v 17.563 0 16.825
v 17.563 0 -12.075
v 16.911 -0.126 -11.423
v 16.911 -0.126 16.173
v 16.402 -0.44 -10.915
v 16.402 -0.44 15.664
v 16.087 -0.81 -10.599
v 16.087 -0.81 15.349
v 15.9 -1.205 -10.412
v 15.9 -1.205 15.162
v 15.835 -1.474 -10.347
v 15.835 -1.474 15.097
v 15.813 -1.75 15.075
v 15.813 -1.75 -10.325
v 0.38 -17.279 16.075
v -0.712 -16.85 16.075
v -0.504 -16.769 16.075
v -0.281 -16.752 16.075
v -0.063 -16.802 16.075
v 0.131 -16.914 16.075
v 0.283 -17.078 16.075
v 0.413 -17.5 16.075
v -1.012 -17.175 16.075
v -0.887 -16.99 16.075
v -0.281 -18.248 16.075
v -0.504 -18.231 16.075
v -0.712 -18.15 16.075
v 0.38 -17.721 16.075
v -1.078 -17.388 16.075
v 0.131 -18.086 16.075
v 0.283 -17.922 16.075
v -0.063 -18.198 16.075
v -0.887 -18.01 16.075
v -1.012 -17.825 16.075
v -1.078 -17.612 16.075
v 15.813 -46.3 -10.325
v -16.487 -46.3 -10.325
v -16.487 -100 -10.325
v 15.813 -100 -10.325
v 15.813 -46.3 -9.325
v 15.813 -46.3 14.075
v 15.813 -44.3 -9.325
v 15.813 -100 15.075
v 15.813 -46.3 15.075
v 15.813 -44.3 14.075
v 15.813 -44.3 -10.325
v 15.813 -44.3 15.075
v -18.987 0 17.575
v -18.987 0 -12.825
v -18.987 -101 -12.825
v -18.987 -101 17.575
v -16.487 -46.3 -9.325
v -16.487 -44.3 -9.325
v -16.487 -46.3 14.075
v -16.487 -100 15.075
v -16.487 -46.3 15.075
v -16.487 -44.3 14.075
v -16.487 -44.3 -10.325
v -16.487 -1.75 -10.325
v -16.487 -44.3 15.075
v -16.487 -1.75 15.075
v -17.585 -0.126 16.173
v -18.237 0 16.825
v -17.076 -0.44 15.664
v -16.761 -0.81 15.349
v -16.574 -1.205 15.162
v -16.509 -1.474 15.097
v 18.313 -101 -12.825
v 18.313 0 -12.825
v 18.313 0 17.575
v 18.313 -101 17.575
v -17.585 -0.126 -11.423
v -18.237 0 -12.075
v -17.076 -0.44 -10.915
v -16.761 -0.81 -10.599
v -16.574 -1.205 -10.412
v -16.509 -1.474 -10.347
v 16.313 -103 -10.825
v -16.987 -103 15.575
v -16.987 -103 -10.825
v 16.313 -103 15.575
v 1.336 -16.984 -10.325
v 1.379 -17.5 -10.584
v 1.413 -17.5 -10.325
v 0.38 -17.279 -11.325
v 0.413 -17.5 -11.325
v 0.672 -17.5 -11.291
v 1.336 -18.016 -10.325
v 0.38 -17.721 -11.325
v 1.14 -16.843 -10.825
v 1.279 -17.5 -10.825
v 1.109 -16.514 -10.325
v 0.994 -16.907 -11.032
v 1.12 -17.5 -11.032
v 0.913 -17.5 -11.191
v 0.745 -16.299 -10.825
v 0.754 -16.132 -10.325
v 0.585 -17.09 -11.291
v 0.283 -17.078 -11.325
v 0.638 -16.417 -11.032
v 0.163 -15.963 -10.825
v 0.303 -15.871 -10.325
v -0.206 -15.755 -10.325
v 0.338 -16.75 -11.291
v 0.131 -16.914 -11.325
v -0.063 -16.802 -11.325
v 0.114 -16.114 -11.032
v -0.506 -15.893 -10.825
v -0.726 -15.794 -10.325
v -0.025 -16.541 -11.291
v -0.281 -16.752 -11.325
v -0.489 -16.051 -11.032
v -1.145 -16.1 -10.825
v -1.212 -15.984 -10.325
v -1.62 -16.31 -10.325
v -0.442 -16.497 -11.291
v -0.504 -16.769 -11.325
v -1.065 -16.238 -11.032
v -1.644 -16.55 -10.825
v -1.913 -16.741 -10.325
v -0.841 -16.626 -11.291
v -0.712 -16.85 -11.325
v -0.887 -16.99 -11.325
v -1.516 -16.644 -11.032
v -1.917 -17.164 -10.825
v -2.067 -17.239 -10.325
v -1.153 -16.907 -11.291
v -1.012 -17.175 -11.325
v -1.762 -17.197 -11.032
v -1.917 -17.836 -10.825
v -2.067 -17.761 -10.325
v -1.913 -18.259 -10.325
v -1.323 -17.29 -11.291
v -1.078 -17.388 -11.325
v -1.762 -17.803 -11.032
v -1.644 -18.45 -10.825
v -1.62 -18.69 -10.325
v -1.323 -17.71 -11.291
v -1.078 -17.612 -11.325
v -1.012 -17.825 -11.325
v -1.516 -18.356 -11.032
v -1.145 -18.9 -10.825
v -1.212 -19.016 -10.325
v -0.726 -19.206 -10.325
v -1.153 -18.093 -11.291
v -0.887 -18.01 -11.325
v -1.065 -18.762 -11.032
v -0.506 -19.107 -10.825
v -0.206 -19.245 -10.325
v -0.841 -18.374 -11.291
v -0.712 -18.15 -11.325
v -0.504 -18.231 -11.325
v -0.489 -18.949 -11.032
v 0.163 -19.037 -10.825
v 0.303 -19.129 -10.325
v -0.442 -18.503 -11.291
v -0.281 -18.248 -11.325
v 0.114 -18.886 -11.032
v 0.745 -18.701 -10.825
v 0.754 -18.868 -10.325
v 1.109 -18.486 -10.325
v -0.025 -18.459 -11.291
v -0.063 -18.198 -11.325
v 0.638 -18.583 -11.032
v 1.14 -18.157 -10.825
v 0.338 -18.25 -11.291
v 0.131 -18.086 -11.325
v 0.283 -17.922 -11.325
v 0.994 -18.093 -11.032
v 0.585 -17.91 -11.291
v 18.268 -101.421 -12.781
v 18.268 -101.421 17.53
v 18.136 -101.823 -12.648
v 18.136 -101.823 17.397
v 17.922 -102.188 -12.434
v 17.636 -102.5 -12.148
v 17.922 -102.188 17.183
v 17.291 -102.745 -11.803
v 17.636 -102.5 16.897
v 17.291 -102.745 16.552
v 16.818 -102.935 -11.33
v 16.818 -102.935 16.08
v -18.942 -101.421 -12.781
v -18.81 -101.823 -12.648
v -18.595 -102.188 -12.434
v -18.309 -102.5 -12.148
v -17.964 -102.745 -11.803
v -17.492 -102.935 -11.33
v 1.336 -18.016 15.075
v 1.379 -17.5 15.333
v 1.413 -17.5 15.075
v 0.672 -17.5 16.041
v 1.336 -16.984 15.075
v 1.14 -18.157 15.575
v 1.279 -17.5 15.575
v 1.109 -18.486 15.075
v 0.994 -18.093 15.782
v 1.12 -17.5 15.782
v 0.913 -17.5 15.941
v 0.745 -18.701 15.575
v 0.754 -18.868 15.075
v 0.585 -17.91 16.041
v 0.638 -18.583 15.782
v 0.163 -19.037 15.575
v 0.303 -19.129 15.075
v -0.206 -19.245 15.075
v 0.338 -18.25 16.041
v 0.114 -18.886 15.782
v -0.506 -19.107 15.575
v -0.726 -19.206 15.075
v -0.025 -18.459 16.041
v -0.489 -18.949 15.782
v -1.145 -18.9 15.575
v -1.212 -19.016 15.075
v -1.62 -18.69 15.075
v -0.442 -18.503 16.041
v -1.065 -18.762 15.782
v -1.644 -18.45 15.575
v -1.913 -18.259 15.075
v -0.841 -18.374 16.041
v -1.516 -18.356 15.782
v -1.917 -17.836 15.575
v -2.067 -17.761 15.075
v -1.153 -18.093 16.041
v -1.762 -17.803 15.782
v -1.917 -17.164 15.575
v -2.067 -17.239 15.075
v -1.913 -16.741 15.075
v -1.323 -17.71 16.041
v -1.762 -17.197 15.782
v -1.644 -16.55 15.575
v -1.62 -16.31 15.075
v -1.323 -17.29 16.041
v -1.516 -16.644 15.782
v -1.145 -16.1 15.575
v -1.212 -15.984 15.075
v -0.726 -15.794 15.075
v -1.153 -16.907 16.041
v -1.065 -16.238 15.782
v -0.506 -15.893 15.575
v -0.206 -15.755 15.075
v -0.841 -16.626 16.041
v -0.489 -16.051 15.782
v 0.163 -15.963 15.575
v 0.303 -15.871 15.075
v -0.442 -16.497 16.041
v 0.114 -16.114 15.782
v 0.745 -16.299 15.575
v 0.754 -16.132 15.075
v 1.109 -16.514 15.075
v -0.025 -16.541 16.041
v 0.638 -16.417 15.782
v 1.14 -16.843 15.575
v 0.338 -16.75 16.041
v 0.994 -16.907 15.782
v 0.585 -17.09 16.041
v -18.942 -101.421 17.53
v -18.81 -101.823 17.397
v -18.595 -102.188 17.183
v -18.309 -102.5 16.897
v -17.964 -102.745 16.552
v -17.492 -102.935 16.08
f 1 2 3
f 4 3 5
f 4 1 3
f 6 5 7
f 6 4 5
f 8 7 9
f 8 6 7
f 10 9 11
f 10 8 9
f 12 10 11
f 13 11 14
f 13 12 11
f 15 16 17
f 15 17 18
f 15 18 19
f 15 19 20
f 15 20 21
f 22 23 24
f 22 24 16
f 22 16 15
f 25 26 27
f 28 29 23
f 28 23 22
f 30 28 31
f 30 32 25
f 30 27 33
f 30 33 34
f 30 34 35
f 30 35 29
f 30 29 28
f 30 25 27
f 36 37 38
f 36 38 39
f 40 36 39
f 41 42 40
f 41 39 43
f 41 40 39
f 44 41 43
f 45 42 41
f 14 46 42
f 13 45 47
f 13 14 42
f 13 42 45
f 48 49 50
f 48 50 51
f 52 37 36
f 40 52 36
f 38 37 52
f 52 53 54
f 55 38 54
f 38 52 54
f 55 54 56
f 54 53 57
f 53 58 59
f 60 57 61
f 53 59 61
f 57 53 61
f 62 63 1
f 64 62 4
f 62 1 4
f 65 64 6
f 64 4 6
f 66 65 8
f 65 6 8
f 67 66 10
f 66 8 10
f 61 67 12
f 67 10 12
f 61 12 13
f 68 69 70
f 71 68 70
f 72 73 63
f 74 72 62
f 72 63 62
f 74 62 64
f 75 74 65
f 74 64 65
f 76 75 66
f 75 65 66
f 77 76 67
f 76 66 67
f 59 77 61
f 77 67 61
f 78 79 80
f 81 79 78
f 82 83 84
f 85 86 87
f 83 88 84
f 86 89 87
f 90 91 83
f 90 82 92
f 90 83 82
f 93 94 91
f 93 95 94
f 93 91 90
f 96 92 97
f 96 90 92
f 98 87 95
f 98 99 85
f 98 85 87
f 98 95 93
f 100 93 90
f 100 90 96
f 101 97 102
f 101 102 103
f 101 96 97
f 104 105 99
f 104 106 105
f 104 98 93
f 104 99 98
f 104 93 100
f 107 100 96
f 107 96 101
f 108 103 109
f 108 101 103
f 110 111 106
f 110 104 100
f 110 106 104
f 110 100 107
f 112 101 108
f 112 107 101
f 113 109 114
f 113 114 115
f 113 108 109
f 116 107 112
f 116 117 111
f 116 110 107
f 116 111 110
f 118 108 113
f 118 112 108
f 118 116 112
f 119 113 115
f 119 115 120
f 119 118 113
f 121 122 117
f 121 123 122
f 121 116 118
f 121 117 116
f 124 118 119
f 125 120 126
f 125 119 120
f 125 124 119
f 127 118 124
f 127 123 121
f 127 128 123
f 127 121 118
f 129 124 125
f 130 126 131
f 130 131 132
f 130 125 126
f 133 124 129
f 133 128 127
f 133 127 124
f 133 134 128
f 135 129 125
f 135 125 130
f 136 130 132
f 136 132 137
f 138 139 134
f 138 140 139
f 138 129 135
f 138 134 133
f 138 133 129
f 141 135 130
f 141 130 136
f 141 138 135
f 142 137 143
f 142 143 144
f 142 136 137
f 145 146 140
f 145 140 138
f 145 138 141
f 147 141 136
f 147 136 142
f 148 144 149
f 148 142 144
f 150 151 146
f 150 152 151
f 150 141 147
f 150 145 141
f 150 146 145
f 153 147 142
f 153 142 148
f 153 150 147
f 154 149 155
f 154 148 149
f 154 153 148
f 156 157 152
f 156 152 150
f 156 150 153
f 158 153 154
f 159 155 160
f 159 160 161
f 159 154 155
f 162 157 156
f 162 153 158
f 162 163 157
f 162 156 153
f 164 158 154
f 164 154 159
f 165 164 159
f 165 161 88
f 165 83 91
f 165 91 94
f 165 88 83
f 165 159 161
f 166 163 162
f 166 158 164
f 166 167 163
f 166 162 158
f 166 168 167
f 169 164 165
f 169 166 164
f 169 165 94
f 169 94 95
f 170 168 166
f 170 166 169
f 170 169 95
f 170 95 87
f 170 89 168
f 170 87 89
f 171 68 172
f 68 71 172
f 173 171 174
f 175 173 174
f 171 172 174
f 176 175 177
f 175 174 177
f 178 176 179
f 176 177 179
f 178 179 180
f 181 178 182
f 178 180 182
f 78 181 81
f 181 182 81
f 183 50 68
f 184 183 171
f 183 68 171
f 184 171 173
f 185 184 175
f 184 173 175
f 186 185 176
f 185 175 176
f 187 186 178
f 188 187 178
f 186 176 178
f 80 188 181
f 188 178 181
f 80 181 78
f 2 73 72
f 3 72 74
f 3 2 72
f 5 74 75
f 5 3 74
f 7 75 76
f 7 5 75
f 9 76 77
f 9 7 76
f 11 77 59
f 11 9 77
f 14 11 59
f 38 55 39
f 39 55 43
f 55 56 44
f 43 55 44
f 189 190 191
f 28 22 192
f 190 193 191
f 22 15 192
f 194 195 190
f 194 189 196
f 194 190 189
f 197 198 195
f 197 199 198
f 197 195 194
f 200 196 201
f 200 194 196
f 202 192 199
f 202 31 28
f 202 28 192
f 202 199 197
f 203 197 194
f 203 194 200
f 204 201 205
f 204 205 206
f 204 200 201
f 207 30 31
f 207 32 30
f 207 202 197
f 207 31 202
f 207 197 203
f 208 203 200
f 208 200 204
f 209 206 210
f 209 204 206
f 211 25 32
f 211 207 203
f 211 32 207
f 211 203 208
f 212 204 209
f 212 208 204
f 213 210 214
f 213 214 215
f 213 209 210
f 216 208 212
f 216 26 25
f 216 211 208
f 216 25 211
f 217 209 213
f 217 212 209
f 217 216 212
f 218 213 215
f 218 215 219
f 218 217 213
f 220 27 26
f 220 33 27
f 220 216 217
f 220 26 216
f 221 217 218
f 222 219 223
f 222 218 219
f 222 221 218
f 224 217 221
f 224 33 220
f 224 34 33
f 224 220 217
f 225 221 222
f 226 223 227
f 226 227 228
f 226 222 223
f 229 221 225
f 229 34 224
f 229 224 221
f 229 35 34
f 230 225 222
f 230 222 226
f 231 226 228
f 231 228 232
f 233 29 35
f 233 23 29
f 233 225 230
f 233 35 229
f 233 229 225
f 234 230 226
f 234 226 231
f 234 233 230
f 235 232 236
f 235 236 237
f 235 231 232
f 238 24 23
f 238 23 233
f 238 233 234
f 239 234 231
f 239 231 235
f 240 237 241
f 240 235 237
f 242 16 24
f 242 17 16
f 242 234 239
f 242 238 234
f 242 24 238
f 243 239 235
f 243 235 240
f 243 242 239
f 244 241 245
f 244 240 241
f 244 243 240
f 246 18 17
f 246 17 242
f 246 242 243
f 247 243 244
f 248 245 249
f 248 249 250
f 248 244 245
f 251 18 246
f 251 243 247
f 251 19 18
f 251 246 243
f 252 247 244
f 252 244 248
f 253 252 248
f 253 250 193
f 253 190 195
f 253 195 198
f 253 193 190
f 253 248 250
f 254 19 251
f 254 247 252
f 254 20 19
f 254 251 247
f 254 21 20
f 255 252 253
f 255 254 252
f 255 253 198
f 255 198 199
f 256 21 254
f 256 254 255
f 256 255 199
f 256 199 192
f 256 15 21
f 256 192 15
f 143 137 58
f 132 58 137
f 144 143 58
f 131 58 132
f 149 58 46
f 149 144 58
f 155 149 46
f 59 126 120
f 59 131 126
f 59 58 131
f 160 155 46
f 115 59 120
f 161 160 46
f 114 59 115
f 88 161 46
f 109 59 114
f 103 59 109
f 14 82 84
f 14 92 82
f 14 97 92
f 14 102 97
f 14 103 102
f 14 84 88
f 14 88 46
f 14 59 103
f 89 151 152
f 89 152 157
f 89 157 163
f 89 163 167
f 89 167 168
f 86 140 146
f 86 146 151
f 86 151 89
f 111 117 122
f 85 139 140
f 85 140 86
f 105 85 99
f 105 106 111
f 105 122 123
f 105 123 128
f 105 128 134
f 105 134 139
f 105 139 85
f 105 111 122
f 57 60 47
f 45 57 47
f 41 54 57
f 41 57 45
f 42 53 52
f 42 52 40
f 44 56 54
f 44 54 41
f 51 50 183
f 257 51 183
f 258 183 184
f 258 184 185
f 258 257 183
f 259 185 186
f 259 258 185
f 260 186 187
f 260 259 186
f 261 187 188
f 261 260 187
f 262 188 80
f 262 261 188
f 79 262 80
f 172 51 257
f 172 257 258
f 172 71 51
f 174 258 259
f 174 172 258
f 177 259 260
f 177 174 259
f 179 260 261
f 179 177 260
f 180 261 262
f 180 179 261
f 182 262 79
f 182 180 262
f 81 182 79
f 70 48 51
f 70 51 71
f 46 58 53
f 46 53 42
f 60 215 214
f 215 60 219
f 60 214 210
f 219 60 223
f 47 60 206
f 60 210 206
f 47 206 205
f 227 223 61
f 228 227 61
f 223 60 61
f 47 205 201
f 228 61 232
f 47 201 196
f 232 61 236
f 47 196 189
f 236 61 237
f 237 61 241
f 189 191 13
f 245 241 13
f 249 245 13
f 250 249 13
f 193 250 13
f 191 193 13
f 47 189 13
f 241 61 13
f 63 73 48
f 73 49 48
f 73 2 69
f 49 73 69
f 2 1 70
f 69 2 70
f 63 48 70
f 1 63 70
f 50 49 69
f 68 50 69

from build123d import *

# Parameters (mm, degrees)
F0_W      = 37.3
F0_H      = 30.4
F0_W_2    = 32.3
F0_H_2    = 25.4
F1_DEPTH  = 100
F2_W      = 37.3
F2_H      = 30.4
F3_DEPTH  = 3
F4_R      = 2
F5_R      = 1.75
F6_R      = 1.75
F7_DEPTH  = 1
F8_R      = 0.99999
F9_R      = 1.75
F10_DEPTH = 1
F11_R     = 0.99999
F12_W     = 32.3
F12_H     = 2
F13_DEPTH = 1
F14_W     = 32.3
F14_H     = 2
F15_DEPTH = 1


# Not quite as in the source:
# - a fillet or chamfer is up to 0.001 mm smaller than in the source, because OpenCascade refuses the exact size


with BuildPart() as f1:
    # F0 (on Front) → F1 (new body)
    with BuildSketch(Plane.XZ):
        with Locations((-0.3367068468, 2.3746712297)):
            Rectangle(F0_W, F0_H)
        with Locations((-0.3367068468, 2.3746712297)):
            Rectangle(F0_W_2, F0_H_2, mode=Mode.SUBTRACT)
    extrude(amount=F1_DEPTH)

    # F2 (on face) → F3 (join)
    with BuildSketch(Plane.XZ.offset(100)):
        with Locations((-0.3367068468, 2.3746712297)):
            Rectangle(F2_W, F2_H)
    extrude(amount=F3_DEPTH)

    # F4
    f4_edges = [f1.edges().sort_by_distance(p)[0] for p in [
        (-0.336707, -103, 17.574671),
        (-18.986707, -103, 2.374671),
        (-0.336707, -103, -12.825329),
        (18.313293, -103, 2.374671),
    ]]
    fillet(f4_edges, radius=F4_R)

    # F5
    f5_edges = [f1.edges().sort_by_distance(p)[0] for p in [
        (15.813293, 0, 2.374671),
        (-0.336707, 0, 15.074671),
        (-16.486707, 0, 2.374671),
        (-0.336707, 0, -10.325329),
    ]]
    fillet(f5_edges, radius=F5_R)

    # F6 (on face) → F7 (cut)
    with BuildSketch(Plane.XY.offset(-10.3253287703)):
        with Locations((-0.3367068468, -17.5)):
            Circle(F6_R)
    extrude(amount=-F7_DEPTH, mode=Mode.SUBTRACT)

    # F8 (radius 1 in the source; OpenCascade refuses exactly that, so slightly less here)
    f8_edges = [f1.edges().sort_by_distance(p)[0] for p in [
        (-2.086707, -17.5, -11.325329),
    ]]
    fillet(f8_edges, radius=F8_R)

    # F9 (on face) → F10 (cut)
    with BuildSketch(Plane(origin=(0, 0, 15.0746712297), x_dir=(1, 0, 0), z_dir=(0, 0, -1))):
        with Locations((-0.3367068468, 17.5)):
            Circle(F9_R)
    extrude(amount=-F10_DEPTH, mode=Mode.SUBTRACT)

    # F11 (radius 1 in the source; OpenCascade refuses exactly that, so slightly less here)
    f11_edges = [f1.edges().sort_by_distance(p)[0] for p in [
        (-2.086707, -17.5, 16.074671),
    ]]
    fillet(f11_edges, radius=F11_R)

    # F12 (on face) → F13 (join)
    with BuildSketch(Plane.XY.offset(-10.3253287703)):
        with Locations((-0.3367068468, -45.3)):
            Rectangle(F12_W, F12_H)
    extrude(amount=F13_DEPTH)

    # F14 (on face) → F15 (join)
    with BuildSketch(Plane(origin=(0, 0, 15.0746712297), x_dir=(1, 0, 0), z_dir=(0, 0, -1))):
        with Locations((-0.3367068468, 45.3)):
            Rectangle(F14_W, F14_H)
    extrude(amount=F15_DEPTH)


solid = f1.part
